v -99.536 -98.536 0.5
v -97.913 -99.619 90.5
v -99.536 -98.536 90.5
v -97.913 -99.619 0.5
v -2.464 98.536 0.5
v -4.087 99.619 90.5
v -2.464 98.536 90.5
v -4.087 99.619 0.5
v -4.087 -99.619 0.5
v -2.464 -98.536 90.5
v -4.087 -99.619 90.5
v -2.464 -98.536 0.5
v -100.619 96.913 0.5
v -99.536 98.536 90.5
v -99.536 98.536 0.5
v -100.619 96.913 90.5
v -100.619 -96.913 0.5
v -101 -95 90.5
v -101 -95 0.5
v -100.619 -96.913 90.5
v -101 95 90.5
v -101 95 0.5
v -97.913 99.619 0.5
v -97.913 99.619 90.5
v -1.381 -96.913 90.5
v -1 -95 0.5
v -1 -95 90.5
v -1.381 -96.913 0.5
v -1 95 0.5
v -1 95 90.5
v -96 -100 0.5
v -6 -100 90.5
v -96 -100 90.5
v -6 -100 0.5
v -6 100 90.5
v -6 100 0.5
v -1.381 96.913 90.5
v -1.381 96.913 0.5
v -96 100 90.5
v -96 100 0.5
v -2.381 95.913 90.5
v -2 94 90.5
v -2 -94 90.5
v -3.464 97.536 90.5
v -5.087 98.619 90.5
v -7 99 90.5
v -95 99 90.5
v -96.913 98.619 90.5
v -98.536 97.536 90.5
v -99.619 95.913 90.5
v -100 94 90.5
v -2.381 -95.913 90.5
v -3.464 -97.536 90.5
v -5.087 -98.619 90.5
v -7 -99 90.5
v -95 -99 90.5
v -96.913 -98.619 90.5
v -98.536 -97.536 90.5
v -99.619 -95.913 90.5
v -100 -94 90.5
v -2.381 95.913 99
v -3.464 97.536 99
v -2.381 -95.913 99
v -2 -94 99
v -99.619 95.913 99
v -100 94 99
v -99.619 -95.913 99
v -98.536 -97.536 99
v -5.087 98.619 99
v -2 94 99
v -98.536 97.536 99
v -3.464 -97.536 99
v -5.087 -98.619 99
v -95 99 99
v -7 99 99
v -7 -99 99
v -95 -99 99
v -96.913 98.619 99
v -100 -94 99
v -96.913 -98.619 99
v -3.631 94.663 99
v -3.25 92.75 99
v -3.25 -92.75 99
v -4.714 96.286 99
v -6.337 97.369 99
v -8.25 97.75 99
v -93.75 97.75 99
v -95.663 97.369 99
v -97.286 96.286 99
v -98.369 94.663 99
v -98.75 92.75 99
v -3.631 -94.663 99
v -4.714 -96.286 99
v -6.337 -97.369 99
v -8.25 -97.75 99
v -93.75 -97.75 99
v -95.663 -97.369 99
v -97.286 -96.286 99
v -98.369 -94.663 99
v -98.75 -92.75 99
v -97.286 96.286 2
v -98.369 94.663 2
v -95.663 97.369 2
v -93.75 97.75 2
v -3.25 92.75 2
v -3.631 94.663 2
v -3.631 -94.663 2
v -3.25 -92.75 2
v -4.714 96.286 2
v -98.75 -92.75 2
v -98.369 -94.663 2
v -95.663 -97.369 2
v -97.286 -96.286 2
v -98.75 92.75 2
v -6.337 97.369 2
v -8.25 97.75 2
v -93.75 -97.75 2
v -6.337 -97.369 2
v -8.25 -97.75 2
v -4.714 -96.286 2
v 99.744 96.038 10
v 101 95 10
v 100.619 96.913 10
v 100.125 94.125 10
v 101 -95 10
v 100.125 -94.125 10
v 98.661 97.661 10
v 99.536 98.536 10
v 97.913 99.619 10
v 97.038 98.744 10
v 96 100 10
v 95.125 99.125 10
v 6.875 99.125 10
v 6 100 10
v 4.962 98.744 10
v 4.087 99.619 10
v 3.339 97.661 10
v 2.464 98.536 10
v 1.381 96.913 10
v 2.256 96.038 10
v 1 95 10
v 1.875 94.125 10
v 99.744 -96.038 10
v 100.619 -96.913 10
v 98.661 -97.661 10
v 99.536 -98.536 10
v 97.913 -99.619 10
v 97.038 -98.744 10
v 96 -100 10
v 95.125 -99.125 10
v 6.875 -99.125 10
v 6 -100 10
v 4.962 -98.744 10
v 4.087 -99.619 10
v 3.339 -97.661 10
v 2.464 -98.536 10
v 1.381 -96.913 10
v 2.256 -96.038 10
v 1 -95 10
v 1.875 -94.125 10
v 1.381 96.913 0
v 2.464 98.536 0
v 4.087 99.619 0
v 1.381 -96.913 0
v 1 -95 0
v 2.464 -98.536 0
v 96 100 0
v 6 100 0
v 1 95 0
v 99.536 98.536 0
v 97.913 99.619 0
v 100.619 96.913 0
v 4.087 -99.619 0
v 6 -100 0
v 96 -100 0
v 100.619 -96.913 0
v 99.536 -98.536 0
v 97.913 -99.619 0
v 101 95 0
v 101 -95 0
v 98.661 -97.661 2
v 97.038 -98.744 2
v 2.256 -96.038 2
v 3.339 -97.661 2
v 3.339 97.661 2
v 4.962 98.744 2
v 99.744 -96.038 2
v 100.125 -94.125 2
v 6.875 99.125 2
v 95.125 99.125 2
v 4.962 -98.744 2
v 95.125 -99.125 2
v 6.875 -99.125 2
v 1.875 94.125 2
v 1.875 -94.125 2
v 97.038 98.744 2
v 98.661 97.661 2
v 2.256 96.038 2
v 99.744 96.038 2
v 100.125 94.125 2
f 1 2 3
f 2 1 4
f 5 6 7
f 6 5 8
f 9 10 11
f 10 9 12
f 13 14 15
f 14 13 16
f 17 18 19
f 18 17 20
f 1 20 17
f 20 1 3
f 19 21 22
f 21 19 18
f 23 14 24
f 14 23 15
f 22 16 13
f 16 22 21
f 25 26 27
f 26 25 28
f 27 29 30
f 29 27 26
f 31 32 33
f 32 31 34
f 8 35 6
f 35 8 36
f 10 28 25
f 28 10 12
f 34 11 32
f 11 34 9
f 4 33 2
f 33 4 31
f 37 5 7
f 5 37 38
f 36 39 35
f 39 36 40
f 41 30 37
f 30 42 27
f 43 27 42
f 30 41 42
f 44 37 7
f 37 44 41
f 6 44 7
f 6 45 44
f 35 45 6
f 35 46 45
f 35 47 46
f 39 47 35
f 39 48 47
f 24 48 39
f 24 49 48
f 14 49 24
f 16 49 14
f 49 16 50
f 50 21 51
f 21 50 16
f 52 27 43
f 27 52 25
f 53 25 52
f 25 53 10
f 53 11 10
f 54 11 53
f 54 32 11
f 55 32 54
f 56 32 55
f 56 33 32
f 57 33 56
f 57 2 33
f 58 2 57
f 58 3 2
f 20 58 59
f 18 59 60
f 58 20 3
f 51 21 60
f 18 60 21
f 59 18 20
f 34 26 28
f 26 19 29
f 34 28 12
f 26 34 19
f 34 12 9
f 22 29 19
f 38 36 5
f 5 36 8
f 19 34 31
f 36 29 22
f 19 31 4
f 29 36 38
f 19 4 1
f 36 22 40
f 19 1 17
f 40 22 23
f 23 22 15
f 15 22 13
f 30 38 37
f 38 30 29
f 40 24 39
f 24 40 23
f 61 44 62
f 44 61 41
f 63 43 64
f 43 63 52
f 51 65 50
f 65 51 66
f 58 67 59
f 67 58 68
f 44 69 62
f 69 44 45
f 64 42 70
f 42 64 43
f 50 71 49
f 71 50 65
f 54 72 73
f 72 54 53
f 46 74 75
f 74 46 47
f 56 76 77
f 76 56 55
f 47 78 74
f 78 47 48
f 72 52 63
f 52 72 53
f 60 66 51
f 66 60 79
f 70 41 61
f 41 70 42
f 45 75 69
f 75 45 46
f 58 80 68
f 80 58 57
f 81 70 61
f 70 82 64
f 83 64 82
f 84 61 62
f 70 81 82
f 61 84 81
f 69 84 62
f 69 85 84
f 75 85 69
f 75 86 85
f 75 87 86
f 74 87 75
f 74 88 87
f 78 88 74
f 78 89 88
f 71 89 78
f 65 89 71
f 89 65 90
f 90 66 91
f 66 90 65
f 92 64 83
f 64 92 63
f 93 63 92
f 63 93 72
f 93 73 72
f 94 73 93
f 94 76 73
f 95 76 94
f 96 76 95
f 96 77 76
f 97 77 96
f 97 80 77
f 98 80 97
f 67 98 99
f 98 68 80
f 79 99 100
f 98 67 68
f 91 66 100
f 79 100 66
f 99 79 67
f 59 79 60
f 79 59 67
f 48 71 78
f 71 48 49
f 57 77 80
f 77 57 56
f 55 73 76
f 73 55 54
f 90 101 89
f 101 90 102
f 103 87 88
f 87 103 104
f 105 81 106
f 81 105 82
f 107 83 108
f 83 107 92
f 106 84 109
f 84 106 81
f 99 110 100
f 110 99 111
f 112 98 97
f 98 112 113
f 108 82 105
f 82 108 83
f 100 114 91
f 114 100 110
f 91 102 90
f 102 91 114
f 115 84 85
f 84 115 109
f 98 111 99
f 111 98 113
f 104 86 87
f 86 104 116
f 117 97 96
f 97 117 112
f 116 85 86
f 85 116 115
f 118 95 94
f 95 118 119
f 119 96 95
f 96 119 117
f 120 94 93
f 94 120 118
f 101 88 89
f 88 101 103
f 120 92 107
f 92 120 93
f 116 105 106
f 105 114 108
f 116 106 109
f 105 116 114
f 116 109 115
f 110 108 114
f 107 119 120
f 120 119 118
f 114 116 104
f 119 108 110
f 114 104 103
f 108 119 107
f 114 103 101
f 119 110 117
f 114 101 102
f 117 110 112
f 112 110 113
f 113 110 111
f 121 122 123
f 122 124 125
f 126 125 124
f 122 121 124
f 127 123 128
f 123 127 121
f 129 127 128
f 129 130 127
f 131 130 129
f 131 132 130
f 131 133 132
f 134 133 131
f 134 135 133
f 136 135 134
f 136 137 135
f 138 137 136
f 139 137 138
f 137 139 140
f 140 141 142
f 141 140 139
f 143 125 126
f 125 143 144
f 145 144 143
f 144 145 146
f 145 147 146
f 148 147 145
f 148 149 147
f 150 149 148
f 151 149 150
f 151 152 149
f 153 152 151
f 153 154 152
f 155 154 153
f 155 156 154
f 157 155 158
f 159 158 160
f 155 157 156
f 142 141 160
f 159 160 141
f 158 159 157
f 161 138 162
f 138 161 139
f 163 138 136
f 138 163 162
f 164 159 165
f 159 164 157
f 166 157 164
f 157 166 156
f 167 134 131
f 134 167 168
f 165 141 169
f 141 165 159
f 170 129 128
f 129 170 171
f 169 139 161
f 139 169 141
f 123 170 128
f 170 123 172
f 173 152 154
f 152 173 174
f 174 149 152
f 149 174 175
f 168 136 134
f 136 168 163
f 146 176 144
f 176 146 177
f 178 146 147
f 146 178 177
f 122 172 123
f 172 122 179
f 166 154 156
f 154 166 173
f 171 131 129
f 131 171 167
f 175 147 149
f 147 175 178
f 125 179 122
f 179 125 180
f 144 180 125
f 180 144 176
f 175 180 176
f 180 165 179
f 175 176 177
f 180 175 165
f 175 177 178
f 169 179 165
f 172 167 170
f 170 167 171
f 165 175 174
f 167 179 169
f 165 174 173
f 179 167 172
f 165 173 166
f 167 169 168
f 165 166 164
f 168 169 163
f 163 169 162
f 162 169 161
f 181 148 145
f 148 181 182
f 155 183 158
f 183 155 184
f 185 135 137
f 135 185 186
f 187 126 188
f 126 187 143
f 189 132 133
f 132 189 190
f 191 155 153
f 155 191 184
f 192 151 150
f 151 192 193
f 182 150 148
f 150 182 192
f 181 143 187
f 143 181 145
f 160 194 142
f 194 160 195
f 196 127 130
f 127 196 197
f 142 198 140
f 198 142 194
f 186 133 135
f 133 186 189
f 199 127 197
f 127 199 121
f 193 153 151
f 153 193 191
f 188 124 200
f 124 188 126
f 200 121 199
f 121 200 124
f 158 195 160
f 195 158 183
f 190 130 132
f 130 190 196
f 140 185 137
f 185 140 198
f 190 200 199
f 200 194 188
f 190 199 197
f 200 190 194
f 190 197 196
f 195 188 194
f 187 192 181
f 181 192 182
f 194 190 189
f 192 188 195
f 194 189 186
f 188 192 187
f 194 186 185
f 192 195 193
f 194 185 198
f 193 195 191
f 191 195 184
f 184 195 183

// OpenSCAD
// http://www.thingiverse.com/thing:213934

// ================ variables

//CUSTOMIZER VARIABLES

/* [Main] */

// in mm
x_width=100;

// in mm
y_width=200;

// in mm
height=50;

// Wall thickness in mm
thickness=2; // [1:10]

// Corner roundover in mm (0=sharp corner)
radius=5; // [0:50]

// Generate the box
do_box=1; // [0:no,1:yes]

// Generate a lid
do_lid=1; // [0:no,1:yes]

// height in mm
lid_thickness=5;

//CUSTOMIZER VARIABLES END

// Screw pilot hole size
screw_pilot=1.125*1;

// Screw hole size
screw_hole=2.5*1;

// Whether you want the screw countersunk
screw_countersink=0*1;

// =============== calculated variables
lid_height=min(height/4,lid_thickness);
corner_radius=min(radius,x_width/2,y_width/2);
xadj=x_width-(corner_radius*2);
yadj=y_width-(corner_radius*2);
snugfit=0.5/2;

// =============== program

// ---- The box
if(do_box==1) translate([-((x_width/2+1)*do_lid),0,height/2-thickness]) difference() {

union() {
minkowski() // main body
{
 cube([xadj,yadj,height-lid_height],center=true);
 cylinder(r=corner_radius,h=height-lid_height);
}

translate([0,0,lid_height-thickness]) minkowski() // main body overlap
{
 cube([xadj-thickness,yadj-thickness,height-(thickness*2)],center=true);
 cylinder(r=corner_radius,h=height);
}
}

translate([0,0,thickness*2]) minkowski() // inside area
{
 cube([xadj-((thickness+snugfit)*2),yadj-((thickness+snugfit)*2),height],center=true);
 cylinder(r=corner_radius,h=height);
}

};

// ---- The lid
if(do_lid==1) translate([(x_width/2+1)*do_box,0,lid_height/2]) {

difference() {
minkowski() // main body
{
 cube([xadj,yadj,lid_height],center=true);
 cylinder(r=corner_radius,h=lid_height);
}

translate([0,0,thickness]) minkowski() // inside area
{
 cube([xadj-(thickness-snugfit),yadj-(thickness-snugfit),lid_height],center=true);
 cylinder(r=corner_radius,h=lid_height);
}
}

};
